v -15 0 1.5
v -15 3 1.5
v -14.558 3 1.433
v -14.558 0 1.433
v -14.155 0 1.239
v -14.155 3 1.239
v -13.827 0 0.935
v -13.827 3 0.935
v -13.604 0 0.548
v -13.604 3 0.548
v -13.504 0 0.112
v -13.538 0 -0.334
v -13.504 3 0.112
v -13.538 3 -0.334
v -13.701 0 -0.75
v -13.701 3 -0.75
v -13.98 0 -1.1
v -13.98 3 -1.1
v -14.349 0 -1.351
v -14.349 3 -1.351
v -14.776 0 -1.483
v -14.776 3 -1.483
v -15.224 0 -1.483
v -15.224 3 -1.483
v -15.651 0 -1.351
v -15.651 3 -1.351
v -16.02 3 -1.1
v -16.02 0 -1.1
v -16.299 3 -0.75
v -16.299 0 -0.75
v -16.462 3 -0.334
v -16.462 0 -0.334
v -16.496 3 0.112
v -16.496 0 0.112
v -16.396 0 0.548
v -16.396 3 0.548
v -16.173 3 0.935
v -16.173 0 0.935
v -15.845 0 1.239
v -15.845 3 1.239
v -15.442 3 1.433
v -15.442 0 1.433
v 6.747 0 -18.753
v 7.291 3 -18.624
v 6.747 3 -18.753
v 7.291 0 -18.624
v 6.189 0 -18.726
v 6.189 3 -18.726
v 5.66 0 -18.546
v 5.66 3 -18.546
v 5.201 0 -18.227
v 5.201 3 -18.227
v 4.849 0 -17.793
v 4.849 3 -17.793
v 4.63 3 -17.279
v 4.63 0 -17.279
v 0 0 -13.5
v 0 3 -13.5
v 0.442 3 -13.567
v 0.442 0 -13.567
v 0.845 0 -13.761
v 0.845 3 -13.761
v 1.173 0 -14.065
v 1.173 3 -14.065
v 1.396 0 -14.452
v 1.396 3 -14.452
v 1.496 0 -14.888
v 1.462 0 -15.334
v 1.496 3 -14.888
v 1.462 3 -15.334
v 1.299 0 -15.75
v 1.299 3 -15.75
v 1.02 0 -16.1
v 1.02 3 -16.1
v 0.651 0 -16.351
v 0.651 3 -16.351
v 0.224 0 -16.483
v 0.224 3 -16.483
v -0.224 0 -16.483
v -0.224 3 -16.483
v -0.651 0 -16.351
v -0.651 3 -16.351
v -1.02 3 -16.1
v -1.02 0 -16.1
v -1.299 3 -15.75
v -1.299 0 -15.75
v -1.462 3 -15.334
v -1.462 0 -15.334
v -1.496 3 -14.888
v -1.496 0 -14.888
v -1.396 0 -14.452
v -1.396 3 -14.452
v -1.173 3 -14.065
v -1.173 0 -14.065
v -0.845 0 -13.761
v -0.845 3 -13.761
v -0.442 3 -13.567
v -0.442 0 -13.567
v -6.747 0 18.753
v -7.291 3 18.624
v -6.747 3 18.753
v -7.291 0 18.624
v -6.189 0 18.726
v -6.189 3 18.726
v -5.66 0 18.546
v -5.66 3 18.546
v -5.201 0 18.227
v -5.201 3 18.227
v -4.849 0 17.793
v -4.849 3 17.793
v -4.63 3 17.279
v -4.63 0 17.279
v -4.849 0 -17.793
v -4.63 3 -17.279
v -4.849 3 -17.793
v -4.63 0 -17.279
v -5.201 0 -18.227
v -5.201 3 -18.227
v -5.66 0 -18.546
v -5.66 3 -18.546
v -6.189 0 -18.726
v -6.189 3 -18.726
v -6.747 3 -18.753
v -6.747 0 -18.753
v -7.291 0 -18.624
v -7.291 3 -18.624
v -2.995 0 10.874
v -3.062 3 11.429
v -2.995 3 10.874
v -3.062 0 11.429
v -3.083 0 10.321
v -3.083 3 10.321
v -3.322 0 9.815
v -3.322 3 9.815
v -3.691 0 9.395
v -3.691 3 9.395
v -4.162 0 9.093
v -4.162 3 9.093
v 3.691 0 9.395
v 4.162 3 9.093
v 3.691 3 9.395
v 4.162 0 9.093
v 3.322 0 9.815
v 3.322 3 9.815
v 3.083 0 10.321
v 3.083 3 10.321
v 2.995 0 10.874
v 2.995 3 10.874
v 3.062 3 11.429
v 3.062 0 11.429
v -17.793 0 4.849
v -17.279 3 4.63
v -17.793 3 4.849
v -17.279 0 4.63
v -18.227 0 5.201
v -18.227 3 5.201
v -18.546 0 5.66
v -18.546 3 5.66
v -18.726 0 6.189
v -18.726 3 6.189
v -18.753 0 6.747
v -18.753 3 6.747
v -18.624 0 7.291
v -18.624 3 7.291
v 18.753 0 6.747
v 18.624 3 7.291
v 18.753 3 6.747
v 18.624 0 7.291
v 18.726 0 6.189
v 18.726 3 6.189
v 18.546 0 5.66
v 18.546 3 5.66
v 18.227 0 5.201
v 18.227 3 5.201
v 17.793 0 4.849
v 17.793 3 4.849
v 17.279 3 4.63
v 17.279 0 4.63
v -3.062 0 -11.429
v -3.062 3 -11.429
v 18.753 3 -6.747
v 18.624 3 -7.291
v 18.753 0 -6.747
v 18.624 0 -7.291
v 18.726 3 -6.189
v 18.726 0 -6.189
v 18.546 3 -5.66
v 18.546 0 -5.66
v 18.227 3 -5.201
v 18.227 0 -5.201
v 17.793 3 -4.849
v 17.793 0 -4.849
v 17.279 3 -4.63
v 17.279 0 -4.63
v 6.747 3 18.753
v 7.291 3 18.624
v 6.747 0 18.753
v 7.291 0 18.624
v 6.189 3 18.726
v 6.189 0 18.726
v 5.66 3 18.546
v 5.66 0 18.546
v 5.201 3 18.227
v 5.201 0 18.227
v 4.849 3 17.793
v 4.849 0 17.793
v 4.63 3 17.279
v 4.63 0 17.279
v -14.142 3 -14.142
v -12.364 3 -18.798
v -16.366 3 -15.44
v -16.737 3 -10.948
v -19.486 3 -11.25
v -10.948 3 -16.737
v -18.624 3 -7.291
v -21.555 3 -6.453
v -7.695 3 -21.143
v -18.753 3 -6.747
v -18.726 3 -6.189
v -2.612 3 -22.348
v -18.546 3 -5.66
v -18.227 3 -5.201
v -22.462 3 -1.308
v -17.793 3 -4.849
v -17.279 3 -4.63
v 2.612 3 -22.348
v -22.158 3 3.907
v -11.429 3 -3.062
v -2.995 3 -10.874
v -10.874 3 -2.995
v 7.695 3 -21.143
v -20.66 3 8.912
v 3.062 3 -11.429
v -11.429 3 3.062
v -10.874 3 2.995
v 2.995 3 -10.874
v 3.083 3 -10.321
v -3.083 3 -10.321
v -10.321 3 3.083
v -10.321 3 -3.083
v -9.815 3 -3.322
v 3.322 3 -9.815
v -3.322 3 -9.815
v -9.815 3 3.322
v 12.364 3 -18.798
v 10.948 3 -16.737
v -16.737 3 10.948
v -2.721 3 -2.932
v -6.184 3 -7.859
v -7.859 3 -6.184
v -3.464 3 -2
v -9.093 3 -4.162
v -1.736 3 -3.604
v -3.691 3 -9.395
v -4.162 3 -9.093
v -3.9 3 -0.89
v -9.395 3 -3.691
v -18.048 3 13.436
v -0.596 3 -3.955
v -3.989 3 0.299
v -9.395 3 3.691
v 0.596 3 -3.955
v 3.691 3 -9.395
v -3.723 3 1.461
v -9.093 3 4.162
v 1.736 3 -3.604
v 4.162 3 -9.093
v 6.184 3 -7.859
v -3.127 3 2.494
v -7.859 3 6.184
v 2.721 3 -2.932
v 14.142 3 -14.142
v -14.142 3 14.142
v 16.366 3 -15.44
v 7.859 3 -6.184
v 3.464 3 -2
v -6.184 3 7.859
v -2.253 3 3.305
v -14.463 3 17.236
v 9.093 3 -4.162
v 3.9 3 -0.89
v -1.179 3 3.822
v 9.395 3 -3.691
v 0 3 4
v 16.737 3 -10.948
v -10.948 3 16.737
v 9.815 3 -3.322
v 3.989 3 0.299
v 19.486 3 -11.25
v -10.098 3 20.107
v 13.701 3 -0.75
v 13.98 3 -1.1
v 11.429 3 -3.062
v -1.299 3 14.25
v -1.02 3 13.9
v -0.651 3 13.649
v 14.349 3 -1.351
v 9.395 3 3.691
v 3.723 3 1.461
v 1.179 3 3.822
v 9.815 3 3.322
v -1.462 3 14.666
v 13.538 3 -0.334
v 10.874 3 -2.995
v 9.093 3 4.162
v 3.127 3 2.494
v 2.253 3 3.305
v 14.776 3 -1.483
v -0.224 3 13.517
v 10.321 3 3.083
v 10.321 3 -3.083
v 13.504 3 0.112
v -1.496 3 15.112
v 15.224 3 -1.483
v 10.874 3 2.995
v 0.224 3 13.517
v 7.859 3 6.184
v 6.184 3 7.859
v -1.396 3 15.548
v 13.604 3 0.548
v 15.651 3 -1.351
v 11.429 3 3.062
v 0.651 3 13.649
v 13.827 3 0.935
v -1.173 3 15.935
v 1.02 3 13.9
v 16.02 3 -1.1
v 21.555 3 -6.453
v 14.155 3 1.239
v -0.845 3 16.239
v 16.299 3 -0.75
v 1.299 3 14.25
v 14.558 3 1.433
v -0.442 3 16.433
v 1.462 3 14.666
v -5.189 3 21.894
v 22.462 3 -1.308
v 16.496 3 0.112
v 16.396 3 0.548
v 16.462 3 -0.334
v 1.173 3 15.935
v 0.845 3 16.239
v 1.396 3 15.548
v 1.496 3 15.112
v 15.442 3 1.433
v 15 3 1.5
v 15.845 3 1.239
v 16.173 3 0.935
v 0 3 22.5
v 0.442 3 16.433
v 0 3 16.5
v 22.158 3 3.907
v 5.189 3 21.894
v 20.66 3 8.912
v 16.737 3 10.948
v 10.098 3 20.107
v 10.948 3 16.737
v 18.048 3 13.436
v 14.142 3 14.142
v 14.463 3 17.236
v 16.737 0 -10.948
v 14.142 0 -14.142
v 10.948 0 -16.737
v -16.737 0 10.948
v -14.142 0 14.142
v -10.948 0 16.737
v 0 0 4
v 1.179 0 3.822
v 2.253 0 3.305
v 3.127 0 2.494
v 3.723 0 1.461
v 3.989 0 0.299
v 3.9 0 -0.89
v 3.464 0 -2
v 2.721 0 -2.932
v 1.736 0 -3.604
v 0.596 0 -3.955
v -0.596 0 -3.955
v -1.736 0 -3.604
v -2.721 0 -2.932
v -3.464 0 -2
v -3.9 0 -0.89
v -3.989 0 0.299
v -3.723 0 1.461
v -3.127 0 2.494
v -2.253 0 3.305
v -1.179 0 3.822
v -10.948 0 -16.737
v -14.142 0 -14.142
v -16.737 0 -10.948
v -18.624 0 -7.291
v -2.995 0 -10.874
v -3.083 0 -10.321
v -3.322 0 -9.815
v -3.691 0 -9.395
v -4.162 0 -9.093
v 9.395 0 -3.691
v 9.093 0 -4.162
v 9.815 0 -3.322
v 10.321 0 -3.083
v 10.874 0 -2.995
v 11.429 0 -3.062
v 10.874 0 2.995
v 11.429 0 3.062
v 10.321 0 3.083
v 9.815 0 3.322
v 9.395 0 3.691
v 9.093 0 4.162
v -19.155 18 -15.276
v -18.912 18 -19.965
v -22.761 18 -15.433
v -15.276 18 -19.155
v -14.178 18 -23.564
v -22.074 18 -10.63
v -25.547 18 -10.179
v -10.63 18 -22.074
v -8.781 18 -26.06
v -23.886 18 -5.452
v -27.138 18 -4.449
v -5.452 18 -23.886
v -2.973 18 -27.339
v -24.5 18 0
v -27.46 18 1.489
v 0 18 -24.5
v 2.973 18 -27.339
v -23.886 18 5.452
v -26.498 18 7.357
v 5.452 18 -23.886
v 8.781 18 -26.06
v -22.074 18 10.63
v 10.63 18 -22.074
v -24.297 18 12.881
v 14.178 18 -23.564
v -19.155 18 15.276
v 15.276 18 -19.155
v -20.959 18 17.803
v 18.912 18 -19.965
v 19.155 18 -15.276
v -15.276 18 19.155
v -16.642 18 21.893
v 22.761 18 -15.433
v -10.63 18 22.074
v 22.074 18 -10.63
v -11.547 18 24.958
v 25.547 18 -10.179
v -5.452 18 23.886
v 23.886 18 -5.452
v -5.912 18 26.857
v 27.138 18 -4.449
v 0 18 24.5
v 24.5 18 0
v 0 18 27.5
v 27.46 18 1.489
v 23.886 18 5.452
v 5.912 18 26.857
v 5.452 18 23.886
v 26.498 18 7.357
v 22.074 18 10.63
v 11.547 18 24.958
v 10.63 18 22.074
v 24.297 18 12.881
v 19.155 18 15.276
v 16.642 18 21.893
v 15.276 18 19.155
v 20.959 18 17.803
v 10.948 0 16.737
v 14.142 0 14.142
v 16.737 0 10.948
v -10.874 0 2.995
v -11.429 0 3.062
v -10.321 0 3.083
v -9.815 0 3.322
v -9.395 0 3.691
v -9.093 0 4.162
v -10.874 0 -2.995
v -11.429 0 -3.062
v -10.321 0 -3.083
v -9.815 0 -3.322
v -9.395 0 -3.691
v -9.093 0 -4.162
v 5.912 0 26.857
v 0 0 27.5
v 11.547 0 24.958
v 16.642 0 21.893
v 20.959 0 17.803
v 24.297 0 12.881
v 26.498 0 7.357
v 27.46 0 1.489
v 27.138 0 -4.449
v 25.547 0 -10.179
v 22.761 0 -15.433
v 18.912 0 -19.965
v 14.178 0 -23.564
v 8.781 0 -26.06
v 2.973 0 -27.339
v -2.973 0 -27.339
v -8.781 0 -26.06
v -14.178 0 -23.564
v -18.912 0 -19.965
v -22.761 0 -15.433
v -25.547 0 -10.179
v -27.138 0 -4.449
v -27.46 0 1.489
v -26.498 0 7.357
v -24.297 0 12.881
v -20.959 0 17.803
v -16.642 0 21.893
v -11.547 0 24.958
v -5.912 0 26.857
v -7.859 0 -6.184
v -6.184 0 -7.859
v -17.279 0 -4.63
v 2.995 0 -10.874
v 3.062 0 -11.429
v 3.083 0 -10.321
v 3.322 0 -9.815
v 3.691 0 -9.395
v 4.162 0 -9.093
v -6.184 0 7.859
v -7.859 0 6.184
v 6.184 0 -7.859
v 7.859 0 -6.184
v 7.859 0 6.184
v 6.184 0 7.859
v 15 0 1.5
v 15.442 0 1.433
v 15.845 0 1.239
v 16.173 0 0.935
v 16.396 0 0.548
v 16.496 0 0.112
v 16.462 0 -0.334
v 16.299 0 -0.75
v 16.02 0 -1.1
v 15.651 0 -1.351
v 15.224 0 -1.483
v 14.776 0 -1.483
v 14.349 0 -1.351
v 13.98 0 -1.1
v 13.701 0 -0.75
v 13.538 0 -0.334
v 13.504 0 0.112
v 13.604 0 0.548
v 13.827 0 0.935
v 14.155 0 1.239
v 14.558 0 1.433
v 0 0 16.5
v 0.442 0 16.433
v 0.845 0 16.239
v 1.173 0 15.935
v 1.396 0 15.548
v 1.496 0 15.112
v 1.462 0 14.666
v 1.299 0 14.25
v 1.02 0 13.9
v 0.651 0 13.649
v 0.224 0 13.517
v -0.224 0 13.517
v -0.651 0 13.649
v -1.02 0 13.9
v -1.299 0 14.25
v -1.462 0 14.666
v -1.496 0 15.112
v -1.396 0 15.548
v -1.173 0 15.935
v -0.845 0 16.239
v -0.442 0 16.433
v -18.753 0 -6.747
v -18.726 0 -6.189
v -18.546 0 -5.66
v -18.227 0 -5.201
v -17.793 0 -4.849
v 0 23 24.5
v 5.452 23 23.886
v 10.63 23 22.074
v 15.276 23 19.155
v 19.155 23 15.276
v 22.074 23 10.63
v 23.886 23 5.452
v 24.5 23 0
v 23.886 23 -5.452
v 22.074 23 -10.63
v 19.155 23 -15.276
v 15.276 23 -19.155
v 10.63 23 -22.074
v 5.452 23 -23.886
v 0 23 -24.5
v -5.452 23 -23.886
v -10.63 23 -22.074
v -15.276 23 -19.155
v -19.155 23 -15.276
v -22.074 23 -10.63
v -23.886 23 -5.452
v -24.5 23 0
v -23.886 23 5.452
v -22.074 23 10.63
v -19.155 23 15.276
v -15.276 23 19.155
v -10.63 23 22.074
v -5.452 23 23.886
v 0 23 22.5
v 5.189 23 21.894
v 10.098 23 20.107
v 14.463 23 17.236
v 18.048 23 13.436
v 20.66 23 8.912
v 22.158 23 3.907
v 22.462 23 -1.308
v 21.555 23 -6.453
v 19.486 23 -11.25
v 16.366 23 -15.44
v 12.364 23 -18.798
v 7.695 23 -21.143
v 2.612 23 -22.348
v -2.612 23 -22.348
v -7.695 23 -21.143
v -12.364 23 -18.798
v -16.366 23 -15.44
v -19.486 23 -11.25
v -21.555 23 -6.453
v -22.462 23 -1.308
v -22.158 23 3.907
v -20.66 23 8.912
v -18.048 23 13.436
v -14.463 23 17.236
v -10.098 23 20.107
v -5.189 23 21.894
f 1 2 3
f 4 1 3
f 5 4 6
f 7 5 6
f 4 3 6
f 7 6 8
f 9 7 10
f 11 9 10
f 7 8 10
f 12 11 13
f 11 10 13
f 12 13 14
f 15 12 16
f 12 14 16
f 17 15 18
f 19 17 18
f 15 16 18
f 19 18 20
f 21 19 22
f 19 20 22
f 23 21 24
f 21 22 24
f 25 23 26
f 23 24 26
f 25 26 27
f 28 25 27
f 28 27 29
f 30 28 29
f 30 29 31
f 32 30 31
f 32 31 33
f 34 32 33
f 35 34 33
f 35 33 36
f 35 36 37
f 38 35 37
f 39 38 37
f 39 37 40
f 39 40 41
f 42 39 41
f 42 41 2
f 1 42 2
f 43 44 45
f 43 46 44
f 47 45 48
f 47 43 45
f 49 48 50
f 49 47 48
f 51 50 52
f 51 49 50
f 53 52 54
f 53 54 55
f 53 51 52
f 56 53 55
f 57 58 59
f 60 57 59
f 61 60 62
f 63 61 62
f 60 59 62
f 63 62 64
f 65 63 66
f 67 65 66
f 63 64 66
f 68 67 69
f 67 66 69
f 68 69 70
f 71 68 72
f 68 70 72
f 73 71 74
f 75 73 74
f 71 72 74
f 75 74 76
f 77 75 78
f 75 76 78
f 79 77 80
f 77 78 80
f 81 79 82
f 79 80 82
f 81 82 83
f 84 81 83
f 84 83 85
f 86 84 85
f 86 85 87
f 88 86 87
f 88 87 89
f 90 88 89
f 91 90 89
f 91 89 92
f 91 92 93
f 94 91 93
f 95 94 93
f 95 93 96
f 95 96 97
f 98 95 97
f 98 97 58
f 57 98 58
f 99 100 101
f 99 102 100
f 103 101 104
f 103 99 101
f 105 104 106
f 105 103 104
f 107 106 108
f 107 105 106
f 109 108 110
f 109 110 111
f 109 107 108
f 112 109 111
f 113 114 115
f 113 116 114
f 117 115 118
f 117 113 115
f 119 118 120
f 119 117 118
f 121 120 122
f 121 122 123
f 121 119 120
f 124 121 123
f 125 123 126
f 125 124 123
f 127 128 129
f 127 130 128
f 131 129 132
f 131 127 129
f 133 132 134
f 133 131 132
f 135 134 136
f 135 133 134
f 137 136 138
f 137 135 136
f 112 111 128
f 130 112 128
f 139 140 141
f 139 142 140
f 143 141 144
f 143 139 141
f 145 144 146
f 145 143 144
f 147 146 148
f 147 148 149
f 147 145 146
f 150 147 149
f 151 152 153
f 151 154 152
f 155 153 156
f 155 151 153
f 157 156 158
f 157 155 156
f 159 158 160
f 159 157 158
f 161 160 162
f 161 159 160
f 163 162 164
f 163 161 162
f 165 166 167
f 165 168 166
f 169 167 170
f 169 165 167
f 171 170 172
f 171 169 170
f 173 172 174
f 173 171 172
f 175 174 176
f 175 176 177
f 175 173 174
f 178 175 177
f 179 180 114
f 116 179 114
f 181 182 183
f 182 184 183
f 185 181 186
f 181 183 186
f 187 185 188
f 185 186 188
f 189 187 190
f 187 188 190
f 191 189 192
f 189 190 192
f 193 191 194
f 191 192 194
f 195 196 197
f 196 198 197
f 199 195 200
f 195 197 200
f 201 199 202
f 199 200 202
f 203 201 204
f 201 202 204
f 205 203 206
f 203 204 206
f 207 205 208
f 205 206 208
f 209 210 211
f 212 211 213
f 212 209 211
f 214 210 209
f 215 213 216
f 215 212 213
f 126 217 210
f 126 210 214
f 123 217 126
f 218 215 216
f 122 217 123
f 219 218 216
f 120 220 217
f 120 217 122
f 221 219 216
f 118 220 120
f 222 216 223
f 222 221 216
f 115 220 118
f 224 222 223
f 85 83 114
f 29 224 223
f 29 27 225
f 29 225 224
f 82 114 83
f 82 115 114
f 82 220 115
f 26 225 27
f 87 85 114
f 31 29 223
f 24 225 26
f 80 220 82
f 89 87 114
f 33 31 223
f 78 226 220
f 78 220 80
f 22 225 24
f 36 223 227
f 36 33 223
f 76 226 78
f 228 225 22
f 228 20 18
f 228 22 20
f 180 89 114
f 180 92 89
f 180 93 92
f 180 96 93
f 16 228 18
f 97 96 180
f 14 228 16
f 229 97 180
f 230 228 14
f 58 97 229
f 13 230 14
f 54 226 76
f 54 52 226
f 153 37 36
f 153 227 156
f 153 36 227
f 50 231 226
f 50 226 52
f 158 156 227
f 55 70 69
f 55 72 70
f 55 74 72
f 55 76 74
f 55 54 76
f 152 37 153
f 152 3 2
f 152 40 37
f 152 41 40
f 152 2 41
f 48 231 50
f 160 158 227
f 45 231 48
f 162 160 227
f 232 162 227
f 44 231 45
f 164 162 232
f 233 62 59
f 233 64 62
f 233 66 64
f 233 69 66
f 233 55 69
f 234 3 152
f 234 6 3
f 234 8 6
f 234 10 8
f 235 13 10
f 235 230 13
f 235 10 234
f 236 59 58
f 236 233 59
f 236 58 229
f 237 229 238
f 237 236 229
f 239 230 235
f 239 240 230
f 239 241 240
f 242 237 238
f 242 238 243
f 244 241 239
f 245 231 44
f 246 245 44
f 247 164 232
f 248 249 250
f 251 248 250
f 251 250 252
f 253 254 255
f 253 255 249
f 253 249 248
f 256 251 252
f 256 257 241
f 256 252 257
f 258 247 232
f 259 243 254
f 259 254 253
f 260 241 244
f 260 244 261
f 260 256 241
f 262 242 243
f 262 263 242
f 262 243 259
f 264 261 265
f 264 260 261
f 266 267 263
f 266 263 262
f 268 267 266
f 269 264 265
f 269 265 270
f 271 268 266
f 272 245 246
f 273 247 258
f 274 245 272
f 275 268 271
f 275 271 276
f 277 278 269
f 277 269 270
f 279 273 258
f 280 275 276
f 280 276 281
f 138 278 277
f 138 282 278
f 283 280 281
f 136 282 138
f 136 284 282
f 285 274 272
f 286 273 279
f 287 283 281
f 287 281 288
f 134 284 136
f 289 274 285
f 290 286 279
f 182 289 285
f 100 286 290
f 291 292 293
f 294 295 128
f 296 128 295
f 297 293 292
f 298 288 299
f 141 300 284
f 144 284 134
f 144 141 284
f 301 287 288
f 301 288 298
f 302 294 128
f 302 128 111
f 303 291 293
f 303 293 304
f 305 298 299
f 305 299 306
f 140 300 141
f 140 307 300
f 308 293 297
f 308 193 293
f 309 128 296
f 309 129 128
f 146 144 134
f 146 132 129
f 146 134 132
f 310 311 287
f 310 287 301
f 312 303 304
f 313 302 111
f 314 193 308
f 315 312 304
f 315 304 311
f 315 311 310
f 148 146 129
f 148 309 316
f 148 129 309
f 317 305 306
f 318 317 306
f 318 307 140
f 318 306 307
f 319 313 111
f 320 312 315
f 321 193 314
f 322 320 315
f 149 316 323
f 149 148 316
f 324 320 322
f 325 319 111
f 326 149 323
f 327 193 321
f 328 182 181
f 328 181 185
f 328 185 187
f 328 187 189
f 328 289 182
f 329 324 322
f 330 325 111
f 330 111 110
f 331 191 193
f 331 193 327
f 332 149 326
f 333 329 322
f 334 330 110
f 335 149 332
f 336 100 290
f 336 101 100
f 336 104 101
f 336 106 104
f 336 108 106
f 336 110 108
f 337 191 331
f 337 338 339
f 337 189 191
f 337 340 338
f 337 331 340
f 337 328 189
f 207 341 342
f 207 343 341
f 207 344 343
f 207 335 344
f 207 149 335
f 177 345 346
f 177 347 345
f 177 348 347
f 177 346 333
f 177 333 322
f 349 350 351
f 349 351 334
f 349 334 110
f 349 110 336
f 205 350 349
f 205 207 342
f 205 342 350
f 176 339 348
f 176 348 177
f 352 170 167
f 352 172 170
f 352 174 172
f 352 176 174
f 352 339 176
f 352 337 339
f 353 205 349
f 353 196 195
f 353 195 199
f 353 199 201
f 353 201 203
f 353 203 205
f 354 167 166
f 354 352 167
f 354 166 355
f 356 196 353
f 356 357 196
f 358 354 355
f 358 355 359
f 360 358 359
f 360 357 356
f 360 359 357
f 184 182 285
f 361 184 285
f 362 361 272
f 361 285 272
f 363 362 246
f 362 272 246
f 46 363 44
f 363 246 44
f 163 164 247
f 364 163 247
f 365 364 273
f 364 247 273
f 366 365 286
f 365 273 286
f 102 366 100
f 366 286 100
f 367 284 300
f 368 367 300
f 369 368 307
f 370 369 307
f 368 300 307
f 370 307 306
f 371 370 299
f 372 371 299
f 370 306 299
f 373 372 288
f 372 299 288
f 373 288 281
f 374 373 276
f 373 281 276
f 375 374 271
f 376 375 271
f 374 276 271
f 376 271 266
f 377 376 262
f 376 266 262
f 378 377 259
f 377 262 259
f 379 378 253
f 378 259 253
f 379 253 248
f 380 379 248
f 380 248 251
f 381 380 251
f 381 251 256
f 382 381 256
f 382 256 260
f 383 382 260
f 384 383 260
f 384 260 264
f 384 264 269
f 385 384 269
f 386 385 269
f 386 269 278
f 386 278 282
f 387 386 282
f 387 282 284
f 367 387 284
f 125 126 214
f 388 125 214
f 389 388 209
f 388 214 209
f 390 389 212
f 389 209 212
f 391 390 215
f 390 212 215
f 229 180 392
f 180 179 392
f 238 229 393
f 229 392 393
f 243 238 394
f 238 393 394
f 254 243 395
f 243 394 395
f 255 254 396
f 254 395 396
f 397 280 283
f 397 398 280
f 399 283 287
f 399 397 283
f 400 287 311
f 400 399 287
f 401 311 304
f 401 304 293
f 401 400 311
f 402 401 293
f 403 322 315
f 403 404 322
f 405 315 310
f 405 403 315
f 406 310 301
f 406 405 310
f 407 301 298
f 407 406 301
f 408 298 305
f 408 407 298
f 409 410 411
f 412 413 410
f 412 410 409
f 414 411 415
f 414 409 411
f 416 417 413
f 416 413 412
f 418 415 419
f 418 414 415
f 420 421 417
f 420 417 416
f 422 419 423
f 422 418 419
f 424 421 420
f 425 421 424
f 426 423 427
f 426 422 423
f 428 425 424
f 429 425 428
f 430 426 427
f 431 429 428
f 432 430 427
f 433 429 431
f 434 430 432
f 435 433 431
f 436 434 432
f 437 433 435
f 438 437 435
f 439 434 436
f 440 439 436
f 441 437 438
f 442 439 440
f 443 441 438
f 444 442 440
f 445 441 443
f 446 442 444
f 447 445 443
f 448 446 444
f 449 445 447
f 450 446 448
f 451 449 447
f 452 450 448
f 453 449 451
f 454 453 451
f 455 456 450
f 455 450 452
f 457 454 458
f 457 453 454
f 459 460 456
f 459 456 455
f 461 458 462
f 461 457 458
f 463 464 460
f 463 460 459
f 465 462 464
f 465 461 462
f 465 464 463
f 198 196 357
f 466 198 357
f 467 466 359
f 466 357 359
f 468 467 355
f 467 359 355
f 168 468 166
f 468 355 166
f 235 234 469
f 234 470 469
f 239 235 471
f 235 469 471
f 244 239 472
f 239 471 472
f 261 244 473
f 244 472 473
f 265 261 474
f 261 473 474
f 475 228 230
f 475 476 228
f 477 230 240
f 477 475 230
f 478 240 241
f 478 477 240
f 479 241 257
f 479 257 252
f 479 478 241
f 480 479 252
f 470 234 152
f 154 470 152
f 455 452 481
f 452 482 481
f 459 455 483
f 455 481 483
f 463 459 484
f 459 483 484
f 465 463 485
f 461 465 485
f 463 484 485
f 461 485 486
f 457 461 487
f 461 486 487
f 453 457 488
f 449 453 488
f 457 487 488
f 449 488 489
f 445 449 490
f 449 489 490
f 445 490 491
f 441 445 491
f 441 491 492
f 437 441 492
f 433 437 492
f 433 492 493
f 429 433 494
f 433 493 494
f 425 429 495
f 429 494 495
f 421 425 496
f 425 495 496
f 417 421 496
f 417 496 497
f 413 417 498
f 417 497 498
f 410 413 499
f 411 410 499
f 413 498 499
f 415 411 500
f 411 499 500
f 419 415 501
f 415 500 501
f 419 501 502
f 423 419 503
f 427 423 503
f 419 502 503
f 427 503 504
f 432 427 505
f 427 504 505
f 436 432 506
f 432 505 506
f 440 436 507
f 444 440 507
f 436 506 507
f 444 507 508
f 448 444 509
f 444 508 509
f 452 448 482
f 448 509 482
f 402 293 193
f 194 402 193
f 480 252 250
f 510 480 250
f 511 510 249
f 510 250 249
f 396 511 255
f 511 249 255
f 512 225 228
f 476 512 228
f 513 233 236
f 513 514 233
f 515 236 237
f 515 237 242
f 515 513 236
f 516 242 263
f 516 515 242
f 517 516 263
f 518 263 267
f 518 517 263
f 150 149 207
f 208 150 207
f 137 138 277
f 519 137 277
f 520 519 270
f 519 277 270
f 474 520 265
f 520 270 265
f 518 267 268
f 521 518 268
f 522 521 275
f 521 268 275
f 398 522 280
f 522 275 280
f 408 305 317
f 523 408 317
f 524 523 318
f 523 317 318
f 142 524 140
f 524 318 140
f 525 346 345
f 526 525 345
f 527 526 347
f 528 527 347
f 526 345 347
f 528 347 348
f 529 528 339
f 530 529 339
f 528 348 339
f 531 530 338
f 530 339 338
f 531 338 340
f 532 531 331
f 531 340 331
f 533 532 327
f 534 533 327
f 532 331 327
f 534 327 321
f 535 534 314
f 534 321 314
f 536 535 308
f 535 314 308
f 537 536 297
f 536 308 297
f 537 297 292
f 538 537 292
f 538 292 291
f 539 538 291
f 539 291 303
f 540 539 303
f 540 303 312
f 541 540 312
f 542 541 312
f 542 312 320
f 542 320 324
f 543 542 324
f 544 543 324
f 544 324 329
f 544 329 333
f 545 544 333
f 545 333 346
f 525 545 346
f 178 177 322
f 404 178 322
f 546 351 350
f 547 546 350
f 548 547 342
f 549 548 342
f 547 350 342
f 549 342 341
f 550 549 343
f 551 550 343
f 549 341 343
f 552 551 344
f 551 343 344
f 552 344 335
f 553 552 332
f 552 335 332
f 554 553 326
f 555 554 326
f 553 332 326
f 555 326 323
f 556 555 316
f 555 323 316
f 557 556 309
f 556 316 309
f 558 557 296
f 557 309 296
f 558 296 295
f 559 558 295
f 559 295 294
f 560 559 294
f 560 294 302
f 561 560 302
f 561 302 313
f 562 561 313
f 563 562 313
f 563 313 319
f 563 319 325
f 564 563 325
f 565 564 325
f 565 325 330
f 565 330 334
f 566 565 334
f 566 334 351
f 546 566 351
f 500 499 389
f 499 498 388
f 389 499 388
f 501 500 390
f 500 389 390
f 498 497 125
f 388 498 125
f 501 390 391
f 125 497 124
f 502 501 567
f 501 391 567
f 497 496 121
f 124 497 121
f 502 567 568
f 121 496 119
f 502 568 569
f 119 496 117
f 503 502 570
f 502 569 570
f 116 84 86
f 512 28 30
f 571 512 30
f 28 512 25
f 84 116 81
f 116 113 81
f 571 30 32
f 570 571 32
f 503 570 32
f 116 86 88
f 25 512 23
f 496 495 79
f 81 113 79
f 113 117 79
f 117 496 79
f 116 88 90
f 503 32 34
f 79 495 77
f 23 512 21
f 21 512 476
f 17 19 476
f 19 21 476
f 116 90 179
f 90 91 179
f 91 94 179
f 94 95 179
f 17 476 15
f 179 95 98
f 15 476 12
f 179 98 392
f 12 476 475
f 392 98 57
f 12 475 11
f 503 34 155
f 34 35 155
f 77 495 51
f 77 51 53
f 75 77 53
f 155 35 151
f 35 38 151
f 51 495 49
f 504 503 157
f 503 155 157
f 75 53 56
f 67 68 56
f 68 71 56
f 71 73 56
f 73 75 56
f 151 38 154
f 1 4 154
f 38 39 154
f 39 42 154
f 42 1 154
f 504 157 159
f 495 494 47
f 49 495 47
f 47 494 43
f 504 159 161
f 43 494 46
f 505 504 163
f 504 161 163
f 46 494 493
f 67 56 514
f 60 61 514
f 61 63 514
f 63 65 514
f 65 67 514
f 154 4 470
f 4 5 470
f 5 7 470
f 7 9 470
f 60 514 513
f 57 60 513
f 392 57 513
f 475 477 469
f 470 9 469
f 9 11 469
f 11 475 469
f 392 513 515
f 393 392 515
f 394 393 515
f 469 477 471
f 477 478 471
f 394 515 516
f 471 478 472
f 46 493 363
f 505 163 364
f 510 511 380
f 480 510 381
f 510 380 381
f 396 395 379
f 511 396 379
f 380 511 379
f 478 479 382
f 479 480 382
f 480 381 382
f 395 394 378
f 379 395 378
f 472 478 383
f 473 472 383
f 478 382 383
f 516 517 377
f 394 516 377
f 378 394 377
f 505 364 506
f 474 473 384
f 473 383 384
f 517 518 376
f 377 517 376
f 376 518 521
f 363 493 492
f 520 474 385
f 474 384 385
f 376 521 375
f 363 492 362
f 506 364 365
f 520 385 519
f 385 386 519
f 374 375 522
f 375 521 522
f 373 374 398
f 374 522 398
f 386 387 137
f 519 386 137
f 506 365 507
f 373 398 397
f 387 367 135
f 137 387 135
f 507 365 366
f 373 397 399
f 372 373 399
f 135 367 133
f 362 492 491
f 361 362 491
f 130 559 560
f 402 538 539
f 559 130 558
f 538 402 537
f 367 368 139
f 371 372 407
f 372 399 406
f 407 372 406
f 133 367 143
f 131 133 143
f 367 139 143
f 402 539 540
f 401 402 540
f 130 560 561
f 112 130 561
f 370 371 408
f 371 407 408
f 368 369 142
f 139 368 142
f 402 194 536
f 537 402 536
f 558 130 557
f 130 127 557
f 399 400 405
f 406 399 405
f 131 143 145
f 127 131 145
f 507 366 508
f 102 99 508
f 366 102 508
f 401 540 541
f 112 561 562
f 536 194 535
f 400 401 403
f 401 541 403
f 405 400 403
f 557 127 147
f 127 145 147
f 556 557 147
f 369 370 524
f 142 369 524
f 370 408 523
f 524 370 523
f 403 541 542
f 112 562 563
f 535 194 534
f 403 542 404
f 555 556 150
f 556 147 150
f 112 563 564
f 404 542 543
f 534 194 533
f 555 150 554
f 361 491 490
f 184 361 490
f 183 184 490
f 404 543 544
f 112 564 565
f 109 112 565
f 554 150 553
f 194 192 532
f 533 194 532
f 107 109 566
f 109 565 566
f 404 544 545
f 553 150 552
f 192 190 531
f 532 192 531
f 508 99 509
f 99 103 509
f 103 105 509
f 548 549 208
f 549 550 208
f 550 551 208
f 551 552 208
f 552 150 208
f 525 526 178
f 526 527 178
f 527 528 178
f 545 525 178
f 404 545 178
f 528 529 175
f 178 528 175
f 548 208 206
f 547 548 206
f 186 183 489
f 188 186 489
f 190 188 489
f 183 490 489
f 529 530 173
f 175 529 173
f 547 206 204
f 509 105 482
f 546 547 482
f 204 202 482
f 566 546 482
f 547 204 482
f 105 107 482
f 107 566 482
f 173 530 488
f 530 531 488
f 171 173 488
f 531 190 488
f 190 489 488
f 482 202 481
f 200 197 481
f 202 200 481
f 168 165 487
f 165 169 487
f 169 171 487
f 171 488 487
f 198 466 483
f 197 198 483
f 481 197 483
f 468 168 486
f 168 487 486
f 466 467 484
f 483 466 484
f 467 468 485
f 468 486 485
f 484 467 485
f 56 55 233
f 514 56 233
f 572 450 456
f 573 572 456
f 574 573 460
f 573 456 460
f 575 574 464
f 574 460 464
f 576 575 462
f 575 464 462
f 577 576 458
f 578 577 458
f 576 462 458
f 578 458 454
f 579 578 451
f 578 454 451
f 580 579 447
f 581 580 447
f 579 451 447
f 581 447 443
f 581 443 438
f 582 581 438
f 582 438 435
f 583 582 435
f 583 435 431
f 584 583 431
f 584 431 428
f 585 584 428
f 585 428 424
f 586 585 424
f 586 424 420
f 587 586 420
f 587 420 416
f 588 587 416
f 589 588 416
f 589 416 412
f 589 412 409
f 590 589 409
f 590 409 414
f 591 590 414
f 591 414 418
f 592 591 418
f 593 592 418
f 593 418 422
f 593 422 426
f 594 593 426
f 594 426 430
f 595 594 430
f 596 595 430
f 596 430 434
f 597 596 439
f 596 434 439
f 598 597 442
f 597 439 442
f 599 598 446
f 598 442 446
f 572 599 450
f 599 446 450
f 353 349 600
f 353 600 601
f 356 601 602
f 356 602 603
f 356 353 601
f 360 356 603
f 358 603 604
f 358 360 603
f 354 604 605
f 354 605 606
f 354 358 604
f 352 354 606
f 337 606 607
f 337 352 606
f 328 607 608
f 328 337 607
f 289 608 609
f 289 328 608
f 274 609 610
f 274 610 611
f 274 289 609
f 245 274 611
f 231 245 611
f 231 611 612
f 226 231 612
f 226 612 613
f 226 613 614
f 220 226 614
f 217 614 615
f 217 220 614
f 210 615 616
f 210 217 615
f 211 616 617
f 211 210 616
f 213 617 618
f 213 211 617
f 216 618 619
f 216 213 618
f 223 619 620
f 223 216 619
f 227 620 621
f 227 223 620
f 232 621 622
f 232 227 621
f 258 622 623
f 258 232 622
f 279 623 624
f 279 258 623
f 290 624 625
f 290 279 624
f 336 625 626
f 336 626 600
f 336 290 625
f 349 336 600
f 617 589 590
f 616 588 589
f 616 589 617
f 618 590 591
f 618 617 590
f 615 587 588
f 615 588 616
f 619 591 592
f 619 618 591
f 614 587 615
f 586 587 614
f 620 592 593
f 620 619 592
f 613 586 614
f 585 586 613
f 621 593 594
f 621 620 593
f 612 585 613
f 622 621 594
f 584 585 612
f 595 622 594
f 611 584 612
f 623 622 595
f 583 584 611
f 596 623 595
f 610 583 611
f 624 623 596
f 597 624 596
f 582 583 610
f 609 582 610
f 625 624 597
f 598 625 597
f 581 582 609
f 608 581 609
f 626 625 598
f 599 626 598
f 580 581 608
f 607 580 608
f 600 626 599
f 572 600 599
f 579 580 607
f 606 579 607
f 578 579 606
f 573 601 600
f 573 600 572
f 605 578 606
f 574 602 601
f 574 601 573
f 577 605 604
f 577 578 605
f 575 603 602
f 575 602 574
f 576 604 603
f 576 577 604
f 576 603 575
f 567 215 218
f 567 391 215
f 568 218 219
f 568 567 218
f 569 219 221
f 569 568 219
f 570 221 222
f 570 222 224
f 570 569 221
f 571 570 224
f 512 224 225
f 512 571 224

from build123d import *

# Parameters (mm, degrees)
SKETCH1_R           = 27.5
BOSS_EXTRUDE1_DEPTH = 3
SKETCH2_R           = 27.5
SKETCH2_R_2         = 24.5
BOSS_EXTRUDE2_DEPTH = 15
SKETCH4_R           = 4
CUT_EXTRUDE1_DEPTH  = 5
SKETCH5_R           = 1.5
CUT_EXTRUDE2_DEPTH  = 10
FILLET1_R           = 2
SKETCH6_R           = 24.5
SKETCH6_R_2         = 22.5
BOSS_EXTRUDE3_DEPTH = 20


with BuildPart() as part:
    # Sketch1 → Boss-Extrude1 (new body)
    with BuildSketch(Plane(origin=(0, 0, 0), x_dir=(1, 0, 0), z_dir=(0, 1, 0))):
        Circle(SKETCH1_R)
    extrude(amount=BOSS_EXTRUDE1_DEPTH)

    # Sketch2 → Boss-Extrude2 (add)
    with BuildSketch(Plane(origin=(0, 3, 0), x_dir=(1, 0, 0), z_dir=(0, 1, 0))):
        Circle(SKETCH2_R)
        Circle(SKETCH2_R_2, mode=Mode.SUBTRACT)
    extrude(amount=BOSS_EXTRUDE2_DEPTH)

    # Sketch4 → Cut-Extrude1 (cut)
    with BuildSketch(Plane(origin=(0, 3, 0), x_dir=(1, 0, 0), z_dir=(0, 1, 0))):
        Circle(SKETCH4_R)
    extrude(amount=-CUT_EXTRUDE1_DEPTH, mode=Mode.SUBTRACT)

    # Sketch5 → Cut-Extrude2 (cut)
    with BuildSketch(Plane(origin=(0, 3, 0), x_dir=(1, 0, 0), z_dir=(0, 1, 0))):
        with BuildLine():
            Line((-2.588190451, 9.659258263), (-5.176380902, 19.318516526))
            ThreePointArc((-5.176380902, 19.318516526), (-14.142135624, 14.142135624), (-19.318516526, 5.176380902))
            Line((-19.318516526, 5.176380902), (-9.659258263, 2.588190451))
            ThreePointArc((-9.659258263, 2.588190451), (-7.071067812, 7.071067812), (-2.588190451, 9.659258263))
        make_face()
        with BuildLine():
            ThreePointArc((19.318516526, 5.176380902), (14.142135624, 14.142135624), (5.176380902, 19.318516526))
            Line((5.176380902, 19.318516526), (2.588190451, 9.659258263))
            ThreePointArc((2.588190451, 9.659258263), (7.071067812, 7.071067812), (9.659258263, 2.588190451))
            Line((9.659258263, 2.588190451), (19.318516526, 5.176380902))
        make_face()
        with BuildLine():
            Line((-9.659258263, -2.588190451), (-19.318516526, -5.176380902))
            ThreePointArc((-19.318516526, -5.176380902), (-14.142135624, -14.142135624), (-5.176380902, -19.318516526))
            Line((-5.176380902, -19.318516526), (-2.588190451, -9.659258263))
            ThreePointArc((-2.588190451, -9.659258263), (-7.071067812, -7.071067812), (-9.659258263, -2.588190451))
        make_face()
        with BuildLine():
            ThreePointArc((5.176380902, -19.318516526), (14.142135624, -14.142135624), (19.318516526, -5.176380902))
            Line((19.318516526, -5.176380902), (9.659258263, -2.588190451))
            ThreePointArc((9.659258263, -2.588190451), (7.071067812, -7.071067812), (2.588190451, -9.659258263))
            Line((2.588190451, -9.659258263), (5.176380902, -19.318516526))
        make_face()
        with Locations((0, 15)):
            Circle(SKETCH5_R)
        with Locations((15, 0)):
            Circle(SKETCH5_R)
        with Locations((0, -15)):
            Circle(SKETCH5_R)
        with Locations((-15, 0)):
            Circle(SKETCH5_R)
    extrude(amount=-CUT_EXTRUDE2_DEPTH, mode=Mode.SUBTRACT)

    # Fillet1
    fillet1_edges = [part.edges().sort_by_distance(p)[0] for p in [
        (-2.588190451, 1.5, -9.659258263),
        (-9.659258263, 1.5, -2.588190451),
        (-9.659258263, 1.5, 2.588190451),
        (-2.588190451, 1.5, 9.659258263),
        (2.588190451, 1.5, 9.659258263),
        (9.659258263, 1.5, 2.588190451),
        (2.588190451, 1.5, -9.659258263),
        (9.659258263, 1.5, -2.588190451),
        (19.318516526, 1.5, -5.176380902),
        (5.176380902, 1.5, -19.318516526),
        (19.318516526, 1.5, 5.176380902),
        (5.176380902, 1.5, 19.318516526),
        (-5.176380902, 1.5, 19.318516526),
        (-19.318516526, 1.5, 5.176380902),
        (-5.176380902, 1.5, -19.318516526),
        (-19.318516526, 1.5, -5.176380902),
    ]]
    fillet(fillet1_edges, radius=FILLET1_R)

    # Sketch6 → Boss-Extrude3 (add)
    with BuildSketch(Plane(origin=(0, 3, 0), x_dir=(1, 0, 0), z_dir=(0, 1, 0))):
        Circle(SKETCH6_R)
        Circle(SKETCH6_R_2, mode=Mode.SUBTRACT)
    extrude(amount=BOSS_EXTRUDE3_DEPTH)


solid = part.part
